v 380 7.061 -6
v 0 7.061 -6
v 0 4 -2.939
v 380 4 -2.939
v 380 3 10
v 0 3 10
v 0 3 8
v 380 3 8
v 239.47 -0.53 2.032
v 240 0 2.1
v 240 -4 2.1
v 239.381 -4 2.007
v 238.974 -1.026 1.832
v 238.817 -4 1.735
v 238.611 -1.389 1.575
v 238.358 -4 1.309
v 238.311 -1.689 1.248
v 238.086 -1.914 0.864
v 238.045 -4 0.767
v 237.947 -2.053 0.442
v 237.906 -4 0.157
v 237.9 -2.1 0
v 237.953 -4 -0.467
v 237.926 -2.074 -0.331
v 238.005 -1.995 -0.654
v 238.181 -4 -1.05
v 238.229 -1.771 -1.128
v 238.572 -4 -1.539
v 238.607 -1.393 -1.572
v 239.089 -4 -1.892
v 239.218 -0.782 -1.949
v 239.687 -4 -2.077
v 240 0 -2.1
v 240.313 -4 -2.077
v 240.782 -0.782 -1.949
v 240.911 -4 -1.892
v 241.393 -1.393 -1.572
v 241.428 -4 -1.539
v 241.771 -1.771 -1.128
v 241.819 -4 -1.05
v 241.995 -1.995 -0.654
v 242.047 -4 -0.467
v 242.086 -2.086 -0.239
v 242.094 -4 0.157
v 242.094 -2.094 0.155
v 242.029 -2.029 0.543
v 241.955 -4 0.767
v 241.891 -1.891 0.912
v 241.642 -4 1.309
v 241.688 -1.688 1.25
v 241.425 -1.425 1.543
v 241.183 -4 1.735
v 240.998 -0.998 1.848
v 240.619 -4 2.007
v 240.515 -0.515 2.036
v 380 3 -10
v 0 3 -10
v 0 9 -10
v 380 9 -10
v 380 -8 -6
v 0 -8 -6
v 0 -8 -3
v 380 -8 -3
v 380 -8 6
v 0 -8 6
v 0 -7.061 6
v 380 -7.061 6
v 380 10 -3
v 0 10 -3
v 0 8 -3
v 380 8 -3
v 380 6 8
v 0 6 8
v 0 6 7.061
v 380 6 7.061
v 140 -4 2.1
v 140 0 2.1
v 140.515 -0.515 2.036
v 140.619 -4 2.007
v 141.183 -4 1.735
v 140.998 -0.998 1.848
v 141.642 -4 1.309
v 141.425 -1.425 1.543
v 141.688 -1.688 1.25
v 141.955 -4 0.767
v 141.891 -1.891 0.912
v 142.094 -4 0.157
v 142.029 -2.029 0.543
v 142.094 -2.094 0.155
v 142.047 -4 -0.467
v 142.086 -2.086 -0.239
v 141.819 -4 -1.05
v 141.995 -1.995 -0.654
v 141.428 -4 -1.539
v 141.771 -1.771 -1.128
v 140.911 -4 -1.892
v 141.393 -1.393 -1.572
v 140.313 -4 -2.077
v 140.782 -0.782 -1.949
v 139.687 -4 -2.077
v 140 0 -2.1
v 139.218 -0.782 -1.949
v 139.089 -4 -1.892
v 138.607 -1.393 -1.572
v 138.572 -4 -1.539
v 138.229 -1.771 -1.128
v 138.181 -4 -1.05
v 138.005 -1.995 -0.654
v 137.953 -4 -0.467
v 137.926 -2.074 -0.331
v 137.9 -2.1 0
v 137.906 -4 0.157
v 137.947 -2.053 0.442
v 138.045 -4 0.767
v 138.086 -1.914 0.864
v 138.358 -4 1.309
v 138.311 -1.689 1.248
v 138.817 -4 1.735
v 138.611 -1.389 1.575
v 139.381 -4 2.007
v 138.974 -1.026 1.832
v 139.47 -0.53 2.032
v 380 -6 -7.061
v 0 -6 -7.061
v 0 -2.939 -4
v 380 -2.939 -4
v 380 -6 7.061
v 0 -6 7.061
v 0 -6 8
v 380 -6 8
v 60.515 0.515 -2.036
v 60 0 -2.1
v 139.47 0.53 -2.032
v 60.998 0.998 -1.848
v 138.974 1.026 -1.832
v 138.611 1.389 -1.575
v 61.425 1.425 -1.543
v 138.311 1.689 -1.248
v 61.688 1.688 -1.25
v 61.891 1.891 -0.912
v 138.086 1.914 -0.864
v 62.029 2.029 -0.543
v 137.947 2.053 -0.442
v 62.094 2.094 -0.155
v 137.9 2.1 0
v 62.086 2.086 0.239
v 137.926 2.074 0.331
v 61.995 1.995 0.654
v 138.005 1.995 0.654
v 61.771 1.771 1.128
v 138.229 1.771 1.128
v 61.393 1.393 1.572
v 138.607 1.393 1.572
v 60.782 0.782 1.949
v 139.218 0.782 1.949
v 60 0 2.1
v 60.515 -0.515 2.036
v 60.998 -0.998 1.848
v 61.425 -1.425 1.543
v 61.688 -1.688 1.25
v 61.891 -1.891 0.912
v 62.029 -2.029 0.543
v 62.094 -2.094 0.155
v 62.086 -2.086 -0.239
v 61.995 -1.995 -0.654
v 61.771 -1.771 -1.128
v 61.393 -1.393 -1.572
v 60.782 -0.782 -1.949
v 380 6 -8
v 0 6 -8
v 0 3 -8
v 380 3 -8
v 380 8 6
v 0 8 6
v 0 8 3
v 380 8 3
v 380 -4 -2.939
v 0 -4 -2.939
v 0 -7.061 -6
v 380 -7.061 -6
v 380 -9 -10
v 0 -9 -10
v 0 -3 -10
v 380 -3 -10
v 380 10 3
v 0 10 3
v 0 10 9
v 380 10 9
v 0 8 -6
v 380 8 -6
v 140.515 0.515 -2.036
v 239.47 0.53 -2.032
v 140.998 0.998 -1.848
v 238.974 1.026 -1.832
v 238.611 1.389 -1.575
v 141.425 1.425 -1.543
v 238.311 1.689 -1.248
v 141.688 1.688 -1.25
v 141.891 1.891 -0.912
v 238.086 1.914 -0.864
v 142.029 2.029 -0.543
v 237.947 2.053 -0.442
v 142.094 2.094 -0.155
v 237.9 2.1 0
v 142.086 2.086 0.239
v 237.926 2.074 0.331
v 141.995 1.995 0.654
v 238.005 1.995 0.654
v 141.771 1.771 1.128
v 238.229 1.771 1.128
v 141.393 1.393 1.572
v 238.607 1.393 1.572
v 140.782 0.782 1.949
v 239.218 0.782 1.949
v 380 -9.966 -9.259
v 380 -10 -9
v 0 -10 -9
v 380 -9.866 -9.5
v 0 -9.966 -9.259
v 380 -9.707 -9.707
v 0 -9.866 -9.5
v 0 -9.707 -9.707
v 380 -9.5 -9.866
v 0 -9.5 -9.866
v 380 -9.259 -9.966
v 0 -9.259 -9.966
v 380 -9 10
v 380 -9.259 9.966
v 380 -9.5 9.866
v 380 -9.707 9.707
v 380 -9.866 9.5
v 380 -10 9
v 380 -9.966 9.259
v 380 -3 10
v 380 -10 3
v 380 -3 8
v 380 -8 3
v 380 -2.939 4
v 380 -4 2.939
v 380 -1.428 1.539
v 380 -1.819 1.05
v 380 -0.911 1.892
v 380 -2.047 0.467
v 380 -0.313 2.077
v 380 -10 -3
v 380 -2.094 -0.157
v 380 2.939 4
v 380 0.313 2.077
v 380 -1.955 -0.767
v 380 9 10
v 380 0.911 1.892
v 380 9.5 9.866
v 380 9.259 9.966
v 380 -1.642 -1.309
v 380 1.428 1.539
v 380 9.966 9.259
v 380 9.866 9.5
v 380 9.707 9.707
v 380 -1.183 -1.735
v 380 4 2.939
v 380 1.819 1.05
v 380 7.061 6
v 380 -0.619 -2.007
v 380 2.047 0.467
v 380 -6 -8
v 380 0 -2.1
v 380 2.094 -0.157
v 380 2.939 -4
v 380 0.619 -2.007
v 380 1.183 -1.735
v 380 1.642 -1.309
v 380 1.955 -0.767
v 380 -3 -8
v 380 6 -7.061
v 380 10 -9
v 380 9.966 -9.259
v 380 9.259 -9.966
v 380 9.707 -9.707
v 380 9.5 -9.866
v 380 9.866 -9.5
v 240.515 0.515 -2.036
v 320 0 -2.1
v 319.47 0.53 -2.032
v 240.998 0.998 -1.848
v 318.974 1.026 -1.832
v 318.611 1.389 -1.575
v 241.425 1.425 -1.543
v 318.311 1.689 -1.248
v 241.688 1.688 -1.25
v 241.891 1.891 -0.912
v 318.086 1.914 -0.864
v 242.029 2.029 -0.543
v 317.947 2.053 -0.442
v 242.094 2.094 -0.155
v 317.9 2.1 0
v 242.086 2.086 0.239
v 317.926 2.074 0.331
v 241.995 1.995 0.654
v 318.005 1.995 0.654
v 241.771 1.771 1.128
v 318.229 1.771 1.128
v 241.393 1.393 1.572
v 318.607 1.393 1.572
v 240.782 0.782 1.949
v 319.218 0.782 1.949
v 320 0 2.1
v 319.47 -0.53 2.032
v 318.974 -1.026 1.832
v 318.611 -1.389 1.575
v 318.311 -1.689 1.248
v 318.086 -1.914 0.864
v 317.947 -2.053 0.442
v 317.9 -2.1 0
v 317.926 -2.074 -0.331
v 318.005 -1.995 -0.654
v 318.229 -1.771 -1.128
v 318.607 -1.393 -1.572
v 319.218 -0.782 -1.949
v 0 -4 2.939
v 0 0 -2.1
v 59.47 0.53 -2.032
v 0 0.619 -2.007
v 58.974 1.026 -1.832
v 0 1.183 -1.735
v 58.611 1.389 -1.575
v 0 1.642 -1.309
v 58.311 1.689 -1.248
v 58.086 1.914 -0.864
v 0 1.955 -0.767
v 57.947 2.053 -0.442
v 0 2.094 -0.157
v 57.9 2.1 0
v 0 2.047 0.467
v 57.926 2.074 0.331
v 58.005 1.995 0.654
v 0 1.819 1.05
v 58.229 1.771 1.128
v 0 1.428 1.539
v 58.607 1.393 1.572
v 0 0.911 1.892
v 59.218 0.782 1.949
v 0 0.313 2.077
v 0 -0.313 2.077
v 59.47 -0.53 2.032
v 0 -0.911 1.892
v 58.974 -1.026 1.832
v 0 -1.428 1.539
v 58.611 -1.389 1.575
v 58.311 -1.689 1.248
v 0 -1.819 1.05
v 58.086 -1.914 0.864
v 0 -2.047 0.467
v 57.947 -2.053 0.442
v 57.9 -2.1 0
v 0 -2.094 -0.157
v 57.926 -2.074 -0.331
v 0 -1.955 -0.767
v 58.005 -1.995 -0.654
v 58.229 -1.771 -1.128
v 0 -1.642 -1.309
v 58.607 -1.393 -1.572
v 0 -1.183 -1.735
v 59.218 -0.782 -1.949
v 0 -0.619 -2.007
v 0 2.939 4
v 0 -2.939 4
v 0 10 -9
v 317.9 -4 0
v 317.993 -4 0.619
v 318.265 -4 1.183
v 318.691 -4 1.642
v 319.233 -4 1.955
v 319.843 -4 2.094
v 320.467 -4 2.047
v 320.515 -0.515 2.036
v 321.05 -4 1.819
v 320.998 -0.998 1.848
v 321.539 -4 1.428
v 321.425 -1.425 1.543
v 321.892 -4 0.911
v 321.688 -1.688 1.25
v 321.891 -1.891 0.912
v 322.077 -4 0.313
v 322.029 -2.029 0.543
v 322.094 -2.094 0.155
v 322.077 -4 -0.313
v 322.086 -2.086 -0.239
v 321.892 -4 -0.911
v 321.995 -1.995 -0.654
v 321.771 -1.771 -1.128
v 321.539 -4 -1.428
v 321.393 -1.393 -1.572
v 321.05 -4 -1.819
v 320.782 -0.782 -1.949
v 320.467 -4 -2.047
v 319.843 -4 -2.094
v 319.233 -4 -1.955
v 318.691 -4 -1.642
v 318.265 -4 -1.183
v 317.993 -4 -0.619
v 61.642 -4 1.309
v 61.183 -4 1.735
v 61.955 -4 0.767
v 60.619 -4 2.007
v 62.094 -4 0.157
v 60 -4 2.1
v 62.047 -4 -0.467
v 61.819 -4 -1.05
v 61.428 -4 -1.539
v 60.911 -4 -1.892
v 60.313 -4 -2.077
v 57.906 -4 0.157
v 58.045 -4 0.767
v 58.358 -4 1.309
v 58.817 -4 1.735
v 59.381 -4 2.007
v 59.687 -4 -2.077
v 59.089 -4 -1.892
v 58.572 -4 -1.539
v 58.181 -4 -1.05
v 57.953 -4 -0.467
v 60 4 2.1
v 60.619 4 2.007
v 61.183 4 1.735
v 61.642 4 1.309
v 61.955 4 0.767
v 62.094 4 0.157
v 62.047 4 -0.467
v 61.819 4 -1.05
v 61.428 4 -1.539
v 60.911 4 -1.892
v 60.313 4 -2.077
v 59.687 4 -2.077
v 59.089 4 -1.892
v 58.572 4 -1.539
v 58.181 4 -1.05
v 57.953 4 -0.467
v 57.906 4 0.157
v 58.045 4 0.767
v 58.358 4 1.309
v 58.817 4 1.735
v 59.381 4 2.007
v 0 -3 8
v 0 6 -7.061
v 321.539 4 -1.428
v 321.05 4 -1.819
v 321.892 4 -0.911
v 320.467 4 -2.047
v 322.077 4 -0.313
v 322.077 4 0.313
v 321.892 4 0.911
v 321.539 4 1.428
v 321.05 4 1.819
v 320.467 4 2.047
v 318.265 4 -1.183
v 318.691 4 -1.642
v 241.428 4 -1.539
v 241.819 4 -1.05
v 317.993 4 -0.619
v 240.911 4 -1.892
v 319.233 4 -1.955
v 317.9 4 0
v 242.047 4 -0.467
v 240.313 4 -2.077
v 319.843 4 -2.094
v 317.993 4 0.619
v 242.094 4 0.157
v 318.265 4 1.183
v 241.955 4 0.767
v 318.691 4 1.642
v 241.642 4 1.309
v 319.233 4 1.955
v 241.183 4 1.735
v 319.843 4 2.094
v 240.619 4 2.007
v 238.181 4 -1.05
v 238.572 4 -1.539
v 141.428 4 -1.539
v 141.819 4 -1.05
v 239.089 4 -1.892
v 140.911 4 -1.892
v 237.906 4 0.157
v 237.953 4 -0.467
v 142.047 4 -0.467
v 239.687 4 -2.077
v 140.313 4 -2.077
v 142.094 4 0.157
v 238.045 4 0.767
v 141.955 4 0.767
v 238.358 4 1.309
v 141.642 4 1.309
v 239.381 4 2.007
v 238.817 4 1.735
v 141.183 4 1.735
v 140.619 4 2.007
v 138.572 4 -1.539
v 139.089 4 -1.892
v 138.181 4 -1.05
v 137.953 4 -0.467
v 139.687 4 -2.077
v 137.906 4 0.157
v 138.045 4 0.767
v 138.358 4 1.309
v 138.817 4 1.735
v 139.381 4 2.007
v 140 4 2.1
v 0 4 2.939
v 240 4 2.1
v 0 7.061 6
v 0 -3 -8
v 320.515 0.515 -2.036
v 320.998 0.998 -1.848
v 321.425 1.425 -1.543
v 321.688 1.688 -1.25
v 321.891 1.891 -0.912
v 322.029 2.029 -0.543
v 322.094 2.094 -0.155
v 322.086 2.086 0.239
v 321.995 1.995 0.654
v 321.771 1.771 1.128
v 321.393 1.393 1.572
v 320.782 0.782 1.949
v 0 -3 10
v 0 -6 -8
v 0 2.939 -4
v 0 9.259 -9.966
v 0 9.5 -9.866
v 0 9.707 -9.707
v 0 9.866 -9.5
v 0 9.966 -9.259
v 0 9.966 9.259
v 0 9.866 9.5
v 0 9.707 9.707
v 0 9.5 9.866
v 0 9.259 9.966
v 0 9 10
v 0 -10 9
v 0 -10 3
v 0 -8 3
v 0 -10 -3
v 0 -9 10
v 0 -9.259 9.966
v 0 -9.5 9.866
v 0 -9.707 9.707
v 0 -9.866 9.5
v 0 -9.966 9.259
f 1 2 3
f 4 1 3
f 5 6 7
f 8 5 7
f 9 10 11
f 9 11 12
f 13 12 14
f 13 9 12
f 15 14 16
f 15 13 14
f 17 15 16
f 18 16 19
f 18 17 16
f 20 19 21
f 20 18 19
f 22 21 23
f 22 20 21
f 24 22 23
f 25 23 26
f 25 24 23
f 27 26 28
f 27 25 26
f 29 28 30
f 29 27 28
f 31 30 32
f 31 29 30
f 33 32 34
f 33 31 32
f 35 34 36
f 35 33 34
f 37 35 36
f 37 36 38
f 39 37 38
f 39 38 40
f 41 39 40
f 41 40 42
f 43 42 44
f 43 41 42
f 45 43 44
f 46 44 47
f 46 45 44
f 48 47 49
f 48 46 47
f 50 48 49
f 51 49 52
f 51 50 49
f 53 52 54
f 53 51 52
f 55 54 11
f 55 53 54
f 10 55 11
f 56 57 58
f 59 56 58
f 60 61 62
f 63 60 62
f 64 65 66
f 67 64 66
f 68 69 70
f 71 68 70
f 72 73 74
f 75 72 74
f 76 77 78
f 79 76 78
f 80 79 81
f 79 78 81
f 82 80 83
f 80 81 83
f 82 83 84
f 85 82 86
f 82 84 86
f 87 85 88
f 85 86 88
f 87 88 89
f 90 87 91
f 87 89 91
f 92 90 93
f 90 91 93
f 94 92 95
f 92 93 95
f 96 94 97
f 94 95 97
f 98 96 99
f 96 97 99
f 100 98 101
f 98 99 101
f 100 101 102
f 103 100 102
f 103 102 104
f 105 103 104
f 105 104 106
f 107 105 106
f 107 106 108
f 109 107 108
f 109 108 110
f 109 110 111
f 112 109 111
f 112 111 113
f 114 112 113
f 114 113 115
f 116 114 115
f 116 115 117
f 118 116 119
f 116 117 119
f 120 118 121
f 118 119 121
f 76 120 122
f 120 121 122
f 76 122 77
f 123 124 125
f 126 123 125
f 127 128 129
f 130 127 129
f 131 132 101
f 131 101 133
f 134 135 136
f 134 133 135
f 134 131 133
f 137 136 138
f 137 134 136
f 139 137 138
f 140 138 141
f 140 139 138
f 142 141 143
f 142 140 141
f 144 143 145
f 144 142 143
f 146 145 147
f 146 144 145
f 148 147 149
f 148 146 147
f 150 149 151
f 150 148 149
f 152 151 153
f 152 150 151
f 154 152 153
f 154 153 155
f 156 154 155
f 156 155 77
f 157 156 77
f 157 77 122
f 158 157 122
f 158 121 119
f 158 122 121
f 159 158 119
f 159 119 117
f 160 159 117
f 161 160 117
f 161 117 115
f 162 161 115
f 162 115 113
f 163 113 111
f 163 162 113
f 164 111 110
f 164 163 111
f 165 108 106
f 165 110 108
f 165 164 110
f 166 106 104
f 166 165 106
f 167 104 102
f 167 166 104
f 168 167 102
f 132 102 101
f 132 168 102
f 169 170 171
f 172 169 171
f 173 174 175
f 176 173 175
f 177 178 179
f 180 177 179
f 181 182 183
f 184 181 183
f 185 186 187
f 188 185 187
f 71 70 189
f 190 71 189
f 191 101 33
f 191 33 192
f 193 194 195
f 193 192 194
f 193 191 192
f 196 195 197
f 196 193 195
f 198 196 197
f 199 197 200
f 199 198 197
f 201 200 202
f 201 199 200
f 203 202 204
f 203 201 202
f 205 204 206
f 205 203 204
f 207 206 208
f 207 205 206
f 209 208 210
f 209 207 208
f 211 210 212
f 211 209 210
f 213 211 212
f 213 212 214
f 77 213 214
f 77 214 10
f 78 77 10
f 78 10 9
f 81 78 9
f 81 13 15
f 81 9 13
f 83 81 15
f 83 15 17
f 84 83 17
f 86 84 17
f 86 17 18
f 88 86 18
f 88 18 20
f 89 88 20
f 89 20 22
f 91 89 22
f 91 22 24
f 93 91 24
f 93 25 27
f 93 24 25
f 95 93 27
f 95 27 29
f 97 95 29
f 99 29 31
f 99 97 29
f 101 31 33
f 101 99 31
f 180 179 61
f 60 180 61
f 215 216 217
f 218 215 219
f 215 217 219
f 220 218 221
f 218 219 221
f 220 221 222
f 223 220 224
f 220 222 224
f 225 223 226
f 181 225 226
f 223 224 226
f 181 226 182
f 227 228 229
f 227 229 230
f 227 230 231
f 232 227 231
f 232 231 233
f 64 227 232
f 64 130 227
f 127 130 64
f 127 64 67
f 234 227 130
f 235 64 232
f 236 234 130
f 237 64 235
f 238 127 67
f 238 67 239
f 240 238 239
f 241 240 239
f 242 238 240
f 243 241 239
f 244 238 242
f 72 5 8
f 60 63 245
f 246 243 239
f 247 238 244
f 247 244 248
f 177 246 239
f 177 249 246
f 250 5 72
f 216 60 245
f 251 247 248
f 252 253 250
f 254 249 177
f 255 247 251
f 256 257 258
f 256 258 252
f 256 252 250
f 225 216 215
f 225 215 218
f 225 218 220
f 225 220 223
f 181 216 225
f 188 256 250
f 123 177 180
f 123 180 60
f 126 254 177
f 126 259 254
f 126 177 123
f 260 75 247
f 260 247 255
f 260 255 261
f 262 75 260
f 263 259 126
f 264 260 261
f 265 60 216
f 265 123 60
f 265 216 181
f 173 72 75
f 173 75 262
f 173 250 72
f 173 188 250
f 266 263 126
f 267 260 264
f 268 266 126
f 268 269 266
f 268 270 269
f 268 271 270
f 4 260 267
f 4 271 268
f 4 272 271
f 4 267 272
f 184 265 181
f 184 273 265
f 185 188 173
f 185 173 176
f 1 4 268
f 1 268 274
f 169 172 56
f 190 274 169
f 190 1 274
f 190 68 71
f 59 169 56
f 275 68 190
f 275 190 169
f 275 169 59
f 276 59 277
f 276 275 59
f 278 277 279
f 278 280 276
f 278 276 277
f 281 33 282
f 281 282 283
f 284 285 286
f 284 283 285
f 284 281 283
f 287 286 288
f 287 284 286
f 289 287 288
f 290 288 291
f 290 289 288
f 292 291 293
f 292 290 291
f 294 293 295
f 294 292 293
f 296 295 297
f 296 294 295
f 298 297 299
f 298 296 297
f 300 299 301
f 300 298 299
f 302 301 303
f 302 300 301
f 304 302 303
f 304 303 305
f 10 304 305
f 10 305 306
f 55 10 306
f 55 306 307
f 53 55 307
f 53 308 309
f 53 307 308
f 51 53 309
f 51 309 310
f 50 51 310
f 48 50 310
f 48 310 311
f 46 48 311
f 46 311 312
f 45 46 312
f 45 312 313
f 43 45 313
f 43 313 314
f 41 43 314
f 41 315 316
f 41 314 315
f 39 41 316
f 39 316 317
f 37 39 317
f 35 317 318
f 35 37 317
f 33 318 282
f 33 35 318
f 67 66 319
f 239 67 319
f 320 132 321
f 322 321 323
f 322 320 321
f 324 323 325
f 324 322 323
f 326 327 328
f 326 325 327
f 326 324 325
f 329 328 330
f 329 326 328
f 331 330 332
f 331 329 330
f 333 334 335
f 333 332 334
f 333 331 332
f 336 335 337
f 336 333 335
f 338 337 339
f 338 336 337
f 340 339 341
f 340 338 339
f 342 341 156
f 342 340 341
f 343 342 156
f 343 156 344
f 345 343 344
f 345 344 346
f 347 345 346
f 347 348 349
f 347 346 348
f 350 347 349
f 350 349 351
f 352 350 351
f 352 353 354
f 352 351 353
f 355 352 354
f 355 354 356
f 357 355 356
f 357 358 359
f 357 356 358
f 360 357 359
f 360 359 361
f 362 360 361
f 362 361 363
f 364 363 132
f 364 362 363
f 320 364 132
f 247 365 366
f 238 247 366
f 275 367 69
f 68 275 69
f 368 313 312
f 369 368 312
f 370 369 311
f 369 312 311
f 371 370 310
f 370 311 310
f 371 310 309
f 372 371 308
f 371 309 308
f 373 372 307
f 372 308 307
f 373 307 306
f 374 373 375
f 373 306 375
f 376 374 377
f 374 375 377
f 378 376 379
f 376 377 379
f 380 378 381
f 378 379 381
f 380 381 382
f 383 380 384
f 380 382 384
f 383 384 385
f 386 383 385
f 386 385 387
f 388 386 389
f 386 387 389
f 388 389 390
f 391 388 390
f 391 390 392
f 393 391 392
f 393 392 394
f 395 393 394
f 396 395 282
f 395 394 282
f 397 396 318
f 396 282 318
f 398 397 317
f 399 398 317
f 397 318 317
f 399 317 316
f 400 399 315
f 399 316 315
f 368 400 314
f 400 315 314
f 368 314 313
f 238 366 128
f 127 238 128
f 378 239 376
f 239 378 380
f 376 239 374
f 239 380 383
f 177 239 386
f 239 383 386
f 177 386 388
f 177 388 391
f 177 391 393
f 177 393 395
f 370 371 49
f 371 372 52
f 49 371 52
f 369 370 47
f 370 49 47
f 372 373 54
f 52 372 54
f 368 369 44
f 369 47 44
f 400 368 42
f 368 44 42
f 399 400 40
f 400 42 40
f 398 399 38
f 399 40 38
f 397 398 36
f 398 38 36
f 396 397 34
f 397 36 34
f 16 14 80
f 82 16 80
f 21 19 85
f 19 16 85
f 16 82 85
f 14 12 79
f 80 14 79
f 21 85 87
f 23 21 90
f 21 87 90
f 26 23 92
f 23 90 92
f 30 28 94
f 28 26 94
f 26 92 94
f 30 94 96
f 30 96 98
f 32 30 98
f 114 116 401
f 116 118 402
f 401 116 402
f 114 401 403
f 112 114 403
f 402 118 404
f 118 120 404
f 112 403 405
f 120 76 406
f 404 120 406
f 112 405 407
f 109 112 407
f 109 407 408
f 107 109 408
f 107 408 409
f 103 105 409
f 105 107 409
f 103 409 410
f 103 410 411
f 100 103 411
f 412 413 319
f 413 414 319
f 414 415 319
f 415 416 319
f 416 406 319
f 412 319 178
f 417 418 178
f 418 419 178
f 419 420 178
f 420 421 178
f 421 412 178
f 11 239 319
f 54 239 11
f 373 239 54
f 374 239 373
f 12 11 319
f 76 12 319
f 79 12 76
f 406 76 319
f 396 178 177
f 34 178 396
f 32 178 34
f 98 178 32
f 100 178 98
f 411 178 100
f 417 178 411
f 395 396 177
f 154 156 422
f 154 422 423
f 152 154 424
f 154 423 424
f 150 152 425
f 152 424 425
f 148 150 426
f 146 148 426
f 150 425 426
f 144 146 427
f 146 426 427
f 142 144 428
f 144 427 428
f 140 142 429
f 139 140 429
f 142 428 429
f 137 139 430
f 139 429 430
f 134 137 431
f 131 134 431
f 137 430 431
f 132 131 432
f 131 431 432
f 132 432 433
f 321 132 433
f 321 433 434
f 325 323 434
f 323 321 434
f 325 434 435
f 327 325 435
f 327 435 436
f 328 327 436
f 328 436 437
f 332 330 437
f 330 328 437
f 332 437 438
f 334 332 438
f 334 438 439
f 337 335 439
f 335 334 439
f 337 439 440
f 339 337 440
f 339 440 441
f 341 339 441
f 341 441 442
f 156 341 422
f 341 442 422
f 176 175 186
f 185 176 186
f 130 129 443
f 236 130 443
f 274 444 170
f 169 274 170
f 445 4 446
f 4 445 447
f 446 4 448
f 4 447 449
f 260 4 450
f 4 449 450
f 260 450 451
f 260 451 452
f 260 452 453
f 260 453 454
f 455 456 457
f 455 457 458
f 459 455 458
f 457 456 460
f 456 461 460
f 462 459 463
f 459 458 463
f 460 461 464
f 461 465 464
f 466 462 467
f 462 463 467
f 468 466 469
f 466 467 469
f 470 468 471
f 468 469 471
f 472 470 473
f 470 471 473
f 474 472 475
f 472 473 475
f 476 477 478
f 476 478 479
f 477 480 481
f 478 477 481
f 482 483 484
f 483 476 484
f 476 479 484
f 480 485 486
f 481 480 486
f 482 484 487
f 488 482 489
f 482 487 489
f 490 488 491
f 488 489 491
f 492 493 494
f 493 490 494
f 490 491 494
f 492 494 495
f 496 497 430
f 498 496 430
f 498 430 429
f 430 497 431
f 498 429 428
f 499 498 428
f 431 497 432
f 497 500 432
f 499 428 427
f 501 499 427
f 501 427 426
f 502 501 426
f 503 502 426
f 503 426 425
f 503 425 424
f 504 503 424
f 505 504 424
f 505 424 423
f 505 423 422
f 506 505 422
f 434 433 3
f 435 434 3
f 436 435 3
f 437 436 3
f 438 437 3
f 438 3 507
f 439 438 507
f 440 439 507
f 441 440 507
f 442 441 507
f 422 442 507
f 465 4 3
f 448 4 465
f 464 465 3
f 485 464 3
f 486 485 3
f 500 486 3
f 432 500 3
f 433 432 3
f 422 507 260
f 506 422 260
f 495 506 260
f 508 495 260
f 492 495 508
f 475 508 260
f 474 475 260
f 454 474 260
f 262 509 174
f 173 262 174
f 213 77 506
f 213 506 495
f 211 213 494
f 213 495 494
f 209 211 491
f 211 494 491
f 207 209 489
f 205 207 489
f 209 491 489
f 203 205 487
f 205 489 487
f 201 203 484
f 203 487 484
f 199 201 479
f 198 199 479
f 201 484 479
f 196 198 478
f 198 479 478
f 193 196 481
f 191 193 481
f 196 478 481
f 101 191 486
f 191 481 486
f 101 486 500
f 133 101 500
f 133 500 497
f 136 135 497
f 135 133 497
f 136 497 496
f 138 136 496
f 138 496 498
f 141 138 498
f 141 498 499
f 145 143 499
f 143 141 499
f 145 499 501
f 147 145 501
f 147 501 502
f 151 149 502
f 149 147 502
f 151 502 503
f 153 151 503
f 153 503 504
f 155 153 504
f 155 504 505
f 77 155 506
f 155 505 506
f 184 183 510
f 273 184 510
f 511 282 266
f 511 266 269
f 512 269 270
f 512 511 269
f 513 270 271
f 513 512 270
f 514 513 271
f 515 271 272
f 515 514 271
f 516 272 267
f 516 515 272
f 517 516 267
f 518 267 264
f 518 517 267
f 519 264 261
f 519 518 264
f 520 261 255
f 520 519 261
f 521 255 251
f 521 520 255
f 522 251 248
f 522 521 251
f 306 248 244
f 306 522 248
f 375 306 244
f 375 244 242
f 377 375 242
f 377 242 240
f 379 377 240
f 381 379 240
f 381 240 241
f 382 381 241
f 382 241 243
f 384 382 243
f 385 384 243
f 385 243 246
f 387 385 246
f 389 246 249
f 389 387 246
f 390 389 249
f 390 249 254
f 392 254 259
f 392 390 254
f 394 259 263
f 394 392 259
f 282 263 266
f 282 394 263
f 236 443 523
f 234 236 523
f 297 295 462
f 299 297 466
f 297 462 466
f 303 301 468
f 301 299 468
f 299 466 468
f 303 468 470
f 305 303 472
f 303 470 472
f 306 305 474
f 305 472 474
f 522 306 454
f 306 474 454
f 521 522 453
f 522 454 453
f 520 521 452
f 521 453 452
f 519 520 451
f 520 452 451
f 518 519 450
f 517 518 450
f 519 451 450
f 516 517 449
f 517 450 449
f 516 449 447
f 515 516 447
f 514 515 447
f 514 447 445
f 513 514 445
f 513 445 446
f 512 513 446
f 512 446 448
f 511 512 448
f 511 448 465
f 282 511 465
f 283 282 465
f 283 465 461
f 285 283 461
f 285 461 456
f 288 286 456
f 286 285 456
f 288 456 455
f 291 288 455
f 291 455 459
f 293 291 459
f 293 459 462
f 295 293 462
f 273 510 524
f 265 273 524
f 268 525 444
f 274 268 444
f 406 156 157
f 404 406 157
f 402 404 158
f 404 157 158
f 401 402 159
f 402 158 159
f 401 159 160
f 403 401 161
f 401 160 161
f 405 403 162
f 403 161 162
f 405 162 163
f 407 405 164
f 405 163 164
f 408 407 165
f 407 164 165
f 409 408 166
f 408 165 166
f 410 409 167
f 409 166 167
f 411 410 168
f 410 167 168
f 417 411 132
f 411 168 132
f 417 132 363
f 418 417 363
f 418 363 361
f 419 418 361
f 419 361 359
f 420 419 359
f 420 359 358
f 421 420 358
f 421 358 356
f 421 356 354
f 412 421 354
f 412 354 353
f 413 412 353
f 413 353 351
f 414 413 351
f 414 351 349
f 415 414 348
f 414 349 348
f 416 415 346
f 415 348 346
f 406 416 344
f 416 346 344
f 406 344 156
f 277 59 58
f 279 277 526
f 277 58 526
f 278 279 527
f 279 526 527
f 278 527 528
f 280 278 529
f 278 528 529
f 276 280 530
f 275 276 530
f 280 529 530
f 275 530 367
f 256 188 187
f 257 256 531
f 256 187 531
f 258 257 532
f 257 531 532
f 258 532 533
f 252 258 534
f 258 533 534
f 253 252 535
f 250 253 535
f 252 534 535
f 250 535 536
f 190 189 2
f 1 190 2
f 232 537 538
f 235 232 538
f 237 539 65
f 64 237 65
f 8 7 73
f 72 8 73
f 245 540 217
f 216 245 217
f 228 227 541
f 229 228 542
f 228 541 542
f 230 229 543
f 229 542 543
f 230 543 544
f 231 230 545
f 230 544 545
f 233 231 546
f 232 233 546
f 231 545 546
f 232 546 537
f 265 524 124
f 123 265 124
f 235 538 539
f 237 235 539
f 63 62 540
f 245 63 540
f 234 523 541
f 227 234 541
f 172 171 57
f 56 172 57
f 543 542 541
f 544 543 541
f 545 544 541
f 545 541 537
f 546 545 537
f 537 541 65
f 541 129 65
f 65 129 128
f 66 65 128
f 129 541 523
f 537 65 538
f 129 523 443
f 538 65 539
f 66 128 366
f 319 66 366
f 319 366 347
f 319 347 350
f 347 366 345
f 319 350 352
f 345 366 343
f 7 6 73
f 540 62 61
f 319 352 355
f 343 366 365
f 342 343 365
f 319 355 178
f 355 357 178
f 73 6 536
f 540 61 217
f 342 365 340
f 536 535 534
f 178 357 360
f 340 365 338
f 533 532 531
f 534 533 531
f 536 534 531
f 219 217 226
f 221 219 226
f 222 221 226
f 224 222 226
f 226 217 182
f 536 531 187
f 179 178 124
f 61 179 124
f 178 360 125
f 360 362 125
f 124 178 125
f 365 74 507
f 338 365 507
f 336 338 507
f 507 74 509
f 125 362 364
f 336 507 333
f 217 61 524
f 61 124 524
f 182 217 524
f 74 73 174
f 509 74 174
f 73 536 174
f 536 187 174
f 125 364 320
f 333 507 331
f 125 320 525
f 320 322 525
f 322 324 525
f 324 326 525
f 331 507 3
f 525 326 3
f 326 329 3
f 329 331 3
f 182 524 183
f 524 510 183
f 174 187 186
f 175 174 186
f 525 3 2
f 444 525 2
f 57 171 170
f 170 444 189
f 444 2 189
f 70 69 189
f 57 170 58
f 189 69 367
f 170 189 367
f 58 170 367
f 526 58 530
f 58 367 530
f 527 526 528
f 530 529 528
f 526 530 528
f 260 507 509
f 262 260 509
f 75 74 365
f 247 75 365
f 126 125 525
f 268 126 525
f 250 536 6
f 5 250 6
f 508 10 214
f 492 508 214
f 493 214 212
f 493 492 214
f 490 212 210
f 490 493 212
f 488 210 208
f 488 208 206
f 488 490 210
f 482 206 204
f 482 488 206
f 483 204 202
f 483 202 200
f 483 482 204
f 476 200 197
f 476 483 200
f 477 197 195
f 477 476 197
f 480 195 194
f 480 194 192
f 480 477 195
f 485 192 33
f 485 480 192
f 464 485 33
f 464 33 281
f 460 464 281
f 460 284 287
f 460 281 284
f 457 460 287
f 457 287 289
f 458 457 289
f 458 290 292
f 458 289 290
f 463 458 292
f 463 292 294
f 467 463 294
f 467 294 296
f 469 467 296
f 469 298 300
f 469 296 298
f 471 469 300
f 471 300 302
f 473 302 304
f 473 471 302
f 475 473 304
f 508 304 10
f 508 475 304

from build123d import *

# Parameters (mm, degrees)
SKETCH1_R                = 2.1
BOSS_EXTRUDE1_DEPTH      = 380
SKETCH_1_R               = 2.1
CUT_EXTRUDE_1_DEPTH      = 381.389274297
PATTERN_LINEAR_1_COUNT   = 2
PATTERN_LINEAR_1_PITCH   = 80
MIRROR_2_COPY_1_SKETCH_R = 2.1
MIRROR_2_COPY_1_DEPTH    = 381.389274297
MIRROR_2_COPY_2_SKETCH_R = 2.1
MIRROR_2_COPY_2_DEPTH    = 381.389274297


with BuildPart() as part:
    # Sketch1 → Boss-Extrude1 (new body)
    with BuildSketch(Plane(origin=(0, 0, 0), x_dir=(0, 0, -1), z_dir=(1, 0, 0))):
        with BuildLine():
            Line((-10, 9), (-10, 3))
            Line((-10, 3), (-8, 3))
            Line((-8, 3), (-8, 6))
            Line((-8, 6), (-7.060660172, 6))
            Line((-7.060660172, 6), (-4, 2.939339828))
            Line((-4, 2.939339828), (-4, -2.939339828))
            Line((-4, -2.939339828), (-7.060660172, -6))
            Line((-7.060660172, -6), (-8, -6))
            Line((-8, -6), (-8, -3))
            Line((-8, -3), (-10, -3))
            Line((-10, -3), (-10, -9))
            ThreePointArc((-10, -9), (-9.707106781, -9.707106781), (-9, -10))
            Line((-9, -10), (-3, -10))
            Line((-3, -10), (-3, -8))
            Line((-3, -8), (-6, -8))
            Line((-6, -8), (-6, -7.060660172))
            Line((-6, -7.060660172), (-2.939339828, -4))
            Line((-2.939339828, -4), (2.939339828, -4))
            Line((2.939339828, -4), (6, -7.060660172))
            Line((6, -7.060660172), (6, -8))
            Line((6, -8), (3, -8))
            Line((3, -8), (3, -10))
            Line((3, -10), (9, -10))
            ThreePointArc((9, -10), (9.707106781, -9.707106781), (10, -9))
            Line((10, -9), (10, -3))
            Line((10, -3), (8, -3))
            Line((8, -3), (8, -6))
            Line((8, -6), (7.060660172, -6))
            Line((7.060660172, -6), (4, -2.939339828))
            Line((4, -2.939339828), (4, 2.939339828))
            Line((4, 2.939339828), (7.060660172, 6))
            Line((7.060660172, 6), (8, 6))
            Line((8, 6), (8, 3))
            Line((8, 3), (10, 3))
            Line((10, 3), (10, 9))
            ThreePointArc((10, 9), (9.707106781, 9.707106781), (9, 10))
            Line((9, 10), (3, 10))
            Line((3, 10), (3, 8))
            Line((3, 8), (6, 8))
            Line((6, 8), (6, 7.060660172))
            Line((6, 7.060660172), (2.939339828, 4))
            Line((2.939339828, 4), (-2.939339828, 4))
            Line((-2.939339828, 4), (-6, 7.060660172))
            Line((-6, 7.060660172), (-6, 8))
            Line((-6, 8), (-3, 8))
            Line((-3, 8), (-3, 10))
            Line((-3, 10), (-9, 10))
            ThreePointArc((-9, 10), (-9.707106781, 9.707106781), (-10, 9))
        make_face()
        Circle(SKETCH1_R, mode=Mode.SUBTRACT)
    extrude(amount=BOSS_EXTRUDE1_DEPTH)

    # 草图1 → 切除-拉伸1 (cut, through all)
    with BuildSketch(Plane(origin=(0, 4, 0), x_dir=(1, 0, 0), z_dir=(0, 1, 0))):
        with Locations((140, 0)):
            Circle(SKETCH_1_R)
    cut_extrude_1 = extrude(amount=-CUT_EXTRUDE_1_DEPTH, mode=Mode.SUBTRACT)

    # 阵列(线性)1: 切除-拉伸1 ×2
    with Locations(*[(-i * PATTERN_LINEAR_1_PITCH, 0, 0) for i in range(1, PATTERN_LINEAR_1_COUNT)]):
        add(cut_extrude_1, mode=Mode.SUBTRACT)

    # 镜向2 copy 1 sketch → 镜向2 copy 1 (cut, through all)
    with BuildSketch(Plane(origin=(460, 4, 0), x_dir=(-1, 0, 0), z_dir=(0, 1, 0))):
        with Locations((140, 0)):
            Circle(MIRROR_2_COPY_1_SKETCH_R)
    extrude(amount=-MIRROR_2_COPY_1_DEPTH, mode=Mode.SUBTRACT)

    # 镜向2 copy 2 sketch → 镜向2 copy 2 (cut, through all)
    with BuildSketch(Plane(origin=(380, 4, 0), x_dir=(-1, 0, 0), z_dir=(0, 1, 0))):
        with Locations((140, 0)):
            Circle(MIRROR_2_COPY_2_SKETCH_R)
    extrude(amount=-MIRROR_2_COPY_2_DEPTH, mode=Mode.SUBTRACT)


solid = part.part
